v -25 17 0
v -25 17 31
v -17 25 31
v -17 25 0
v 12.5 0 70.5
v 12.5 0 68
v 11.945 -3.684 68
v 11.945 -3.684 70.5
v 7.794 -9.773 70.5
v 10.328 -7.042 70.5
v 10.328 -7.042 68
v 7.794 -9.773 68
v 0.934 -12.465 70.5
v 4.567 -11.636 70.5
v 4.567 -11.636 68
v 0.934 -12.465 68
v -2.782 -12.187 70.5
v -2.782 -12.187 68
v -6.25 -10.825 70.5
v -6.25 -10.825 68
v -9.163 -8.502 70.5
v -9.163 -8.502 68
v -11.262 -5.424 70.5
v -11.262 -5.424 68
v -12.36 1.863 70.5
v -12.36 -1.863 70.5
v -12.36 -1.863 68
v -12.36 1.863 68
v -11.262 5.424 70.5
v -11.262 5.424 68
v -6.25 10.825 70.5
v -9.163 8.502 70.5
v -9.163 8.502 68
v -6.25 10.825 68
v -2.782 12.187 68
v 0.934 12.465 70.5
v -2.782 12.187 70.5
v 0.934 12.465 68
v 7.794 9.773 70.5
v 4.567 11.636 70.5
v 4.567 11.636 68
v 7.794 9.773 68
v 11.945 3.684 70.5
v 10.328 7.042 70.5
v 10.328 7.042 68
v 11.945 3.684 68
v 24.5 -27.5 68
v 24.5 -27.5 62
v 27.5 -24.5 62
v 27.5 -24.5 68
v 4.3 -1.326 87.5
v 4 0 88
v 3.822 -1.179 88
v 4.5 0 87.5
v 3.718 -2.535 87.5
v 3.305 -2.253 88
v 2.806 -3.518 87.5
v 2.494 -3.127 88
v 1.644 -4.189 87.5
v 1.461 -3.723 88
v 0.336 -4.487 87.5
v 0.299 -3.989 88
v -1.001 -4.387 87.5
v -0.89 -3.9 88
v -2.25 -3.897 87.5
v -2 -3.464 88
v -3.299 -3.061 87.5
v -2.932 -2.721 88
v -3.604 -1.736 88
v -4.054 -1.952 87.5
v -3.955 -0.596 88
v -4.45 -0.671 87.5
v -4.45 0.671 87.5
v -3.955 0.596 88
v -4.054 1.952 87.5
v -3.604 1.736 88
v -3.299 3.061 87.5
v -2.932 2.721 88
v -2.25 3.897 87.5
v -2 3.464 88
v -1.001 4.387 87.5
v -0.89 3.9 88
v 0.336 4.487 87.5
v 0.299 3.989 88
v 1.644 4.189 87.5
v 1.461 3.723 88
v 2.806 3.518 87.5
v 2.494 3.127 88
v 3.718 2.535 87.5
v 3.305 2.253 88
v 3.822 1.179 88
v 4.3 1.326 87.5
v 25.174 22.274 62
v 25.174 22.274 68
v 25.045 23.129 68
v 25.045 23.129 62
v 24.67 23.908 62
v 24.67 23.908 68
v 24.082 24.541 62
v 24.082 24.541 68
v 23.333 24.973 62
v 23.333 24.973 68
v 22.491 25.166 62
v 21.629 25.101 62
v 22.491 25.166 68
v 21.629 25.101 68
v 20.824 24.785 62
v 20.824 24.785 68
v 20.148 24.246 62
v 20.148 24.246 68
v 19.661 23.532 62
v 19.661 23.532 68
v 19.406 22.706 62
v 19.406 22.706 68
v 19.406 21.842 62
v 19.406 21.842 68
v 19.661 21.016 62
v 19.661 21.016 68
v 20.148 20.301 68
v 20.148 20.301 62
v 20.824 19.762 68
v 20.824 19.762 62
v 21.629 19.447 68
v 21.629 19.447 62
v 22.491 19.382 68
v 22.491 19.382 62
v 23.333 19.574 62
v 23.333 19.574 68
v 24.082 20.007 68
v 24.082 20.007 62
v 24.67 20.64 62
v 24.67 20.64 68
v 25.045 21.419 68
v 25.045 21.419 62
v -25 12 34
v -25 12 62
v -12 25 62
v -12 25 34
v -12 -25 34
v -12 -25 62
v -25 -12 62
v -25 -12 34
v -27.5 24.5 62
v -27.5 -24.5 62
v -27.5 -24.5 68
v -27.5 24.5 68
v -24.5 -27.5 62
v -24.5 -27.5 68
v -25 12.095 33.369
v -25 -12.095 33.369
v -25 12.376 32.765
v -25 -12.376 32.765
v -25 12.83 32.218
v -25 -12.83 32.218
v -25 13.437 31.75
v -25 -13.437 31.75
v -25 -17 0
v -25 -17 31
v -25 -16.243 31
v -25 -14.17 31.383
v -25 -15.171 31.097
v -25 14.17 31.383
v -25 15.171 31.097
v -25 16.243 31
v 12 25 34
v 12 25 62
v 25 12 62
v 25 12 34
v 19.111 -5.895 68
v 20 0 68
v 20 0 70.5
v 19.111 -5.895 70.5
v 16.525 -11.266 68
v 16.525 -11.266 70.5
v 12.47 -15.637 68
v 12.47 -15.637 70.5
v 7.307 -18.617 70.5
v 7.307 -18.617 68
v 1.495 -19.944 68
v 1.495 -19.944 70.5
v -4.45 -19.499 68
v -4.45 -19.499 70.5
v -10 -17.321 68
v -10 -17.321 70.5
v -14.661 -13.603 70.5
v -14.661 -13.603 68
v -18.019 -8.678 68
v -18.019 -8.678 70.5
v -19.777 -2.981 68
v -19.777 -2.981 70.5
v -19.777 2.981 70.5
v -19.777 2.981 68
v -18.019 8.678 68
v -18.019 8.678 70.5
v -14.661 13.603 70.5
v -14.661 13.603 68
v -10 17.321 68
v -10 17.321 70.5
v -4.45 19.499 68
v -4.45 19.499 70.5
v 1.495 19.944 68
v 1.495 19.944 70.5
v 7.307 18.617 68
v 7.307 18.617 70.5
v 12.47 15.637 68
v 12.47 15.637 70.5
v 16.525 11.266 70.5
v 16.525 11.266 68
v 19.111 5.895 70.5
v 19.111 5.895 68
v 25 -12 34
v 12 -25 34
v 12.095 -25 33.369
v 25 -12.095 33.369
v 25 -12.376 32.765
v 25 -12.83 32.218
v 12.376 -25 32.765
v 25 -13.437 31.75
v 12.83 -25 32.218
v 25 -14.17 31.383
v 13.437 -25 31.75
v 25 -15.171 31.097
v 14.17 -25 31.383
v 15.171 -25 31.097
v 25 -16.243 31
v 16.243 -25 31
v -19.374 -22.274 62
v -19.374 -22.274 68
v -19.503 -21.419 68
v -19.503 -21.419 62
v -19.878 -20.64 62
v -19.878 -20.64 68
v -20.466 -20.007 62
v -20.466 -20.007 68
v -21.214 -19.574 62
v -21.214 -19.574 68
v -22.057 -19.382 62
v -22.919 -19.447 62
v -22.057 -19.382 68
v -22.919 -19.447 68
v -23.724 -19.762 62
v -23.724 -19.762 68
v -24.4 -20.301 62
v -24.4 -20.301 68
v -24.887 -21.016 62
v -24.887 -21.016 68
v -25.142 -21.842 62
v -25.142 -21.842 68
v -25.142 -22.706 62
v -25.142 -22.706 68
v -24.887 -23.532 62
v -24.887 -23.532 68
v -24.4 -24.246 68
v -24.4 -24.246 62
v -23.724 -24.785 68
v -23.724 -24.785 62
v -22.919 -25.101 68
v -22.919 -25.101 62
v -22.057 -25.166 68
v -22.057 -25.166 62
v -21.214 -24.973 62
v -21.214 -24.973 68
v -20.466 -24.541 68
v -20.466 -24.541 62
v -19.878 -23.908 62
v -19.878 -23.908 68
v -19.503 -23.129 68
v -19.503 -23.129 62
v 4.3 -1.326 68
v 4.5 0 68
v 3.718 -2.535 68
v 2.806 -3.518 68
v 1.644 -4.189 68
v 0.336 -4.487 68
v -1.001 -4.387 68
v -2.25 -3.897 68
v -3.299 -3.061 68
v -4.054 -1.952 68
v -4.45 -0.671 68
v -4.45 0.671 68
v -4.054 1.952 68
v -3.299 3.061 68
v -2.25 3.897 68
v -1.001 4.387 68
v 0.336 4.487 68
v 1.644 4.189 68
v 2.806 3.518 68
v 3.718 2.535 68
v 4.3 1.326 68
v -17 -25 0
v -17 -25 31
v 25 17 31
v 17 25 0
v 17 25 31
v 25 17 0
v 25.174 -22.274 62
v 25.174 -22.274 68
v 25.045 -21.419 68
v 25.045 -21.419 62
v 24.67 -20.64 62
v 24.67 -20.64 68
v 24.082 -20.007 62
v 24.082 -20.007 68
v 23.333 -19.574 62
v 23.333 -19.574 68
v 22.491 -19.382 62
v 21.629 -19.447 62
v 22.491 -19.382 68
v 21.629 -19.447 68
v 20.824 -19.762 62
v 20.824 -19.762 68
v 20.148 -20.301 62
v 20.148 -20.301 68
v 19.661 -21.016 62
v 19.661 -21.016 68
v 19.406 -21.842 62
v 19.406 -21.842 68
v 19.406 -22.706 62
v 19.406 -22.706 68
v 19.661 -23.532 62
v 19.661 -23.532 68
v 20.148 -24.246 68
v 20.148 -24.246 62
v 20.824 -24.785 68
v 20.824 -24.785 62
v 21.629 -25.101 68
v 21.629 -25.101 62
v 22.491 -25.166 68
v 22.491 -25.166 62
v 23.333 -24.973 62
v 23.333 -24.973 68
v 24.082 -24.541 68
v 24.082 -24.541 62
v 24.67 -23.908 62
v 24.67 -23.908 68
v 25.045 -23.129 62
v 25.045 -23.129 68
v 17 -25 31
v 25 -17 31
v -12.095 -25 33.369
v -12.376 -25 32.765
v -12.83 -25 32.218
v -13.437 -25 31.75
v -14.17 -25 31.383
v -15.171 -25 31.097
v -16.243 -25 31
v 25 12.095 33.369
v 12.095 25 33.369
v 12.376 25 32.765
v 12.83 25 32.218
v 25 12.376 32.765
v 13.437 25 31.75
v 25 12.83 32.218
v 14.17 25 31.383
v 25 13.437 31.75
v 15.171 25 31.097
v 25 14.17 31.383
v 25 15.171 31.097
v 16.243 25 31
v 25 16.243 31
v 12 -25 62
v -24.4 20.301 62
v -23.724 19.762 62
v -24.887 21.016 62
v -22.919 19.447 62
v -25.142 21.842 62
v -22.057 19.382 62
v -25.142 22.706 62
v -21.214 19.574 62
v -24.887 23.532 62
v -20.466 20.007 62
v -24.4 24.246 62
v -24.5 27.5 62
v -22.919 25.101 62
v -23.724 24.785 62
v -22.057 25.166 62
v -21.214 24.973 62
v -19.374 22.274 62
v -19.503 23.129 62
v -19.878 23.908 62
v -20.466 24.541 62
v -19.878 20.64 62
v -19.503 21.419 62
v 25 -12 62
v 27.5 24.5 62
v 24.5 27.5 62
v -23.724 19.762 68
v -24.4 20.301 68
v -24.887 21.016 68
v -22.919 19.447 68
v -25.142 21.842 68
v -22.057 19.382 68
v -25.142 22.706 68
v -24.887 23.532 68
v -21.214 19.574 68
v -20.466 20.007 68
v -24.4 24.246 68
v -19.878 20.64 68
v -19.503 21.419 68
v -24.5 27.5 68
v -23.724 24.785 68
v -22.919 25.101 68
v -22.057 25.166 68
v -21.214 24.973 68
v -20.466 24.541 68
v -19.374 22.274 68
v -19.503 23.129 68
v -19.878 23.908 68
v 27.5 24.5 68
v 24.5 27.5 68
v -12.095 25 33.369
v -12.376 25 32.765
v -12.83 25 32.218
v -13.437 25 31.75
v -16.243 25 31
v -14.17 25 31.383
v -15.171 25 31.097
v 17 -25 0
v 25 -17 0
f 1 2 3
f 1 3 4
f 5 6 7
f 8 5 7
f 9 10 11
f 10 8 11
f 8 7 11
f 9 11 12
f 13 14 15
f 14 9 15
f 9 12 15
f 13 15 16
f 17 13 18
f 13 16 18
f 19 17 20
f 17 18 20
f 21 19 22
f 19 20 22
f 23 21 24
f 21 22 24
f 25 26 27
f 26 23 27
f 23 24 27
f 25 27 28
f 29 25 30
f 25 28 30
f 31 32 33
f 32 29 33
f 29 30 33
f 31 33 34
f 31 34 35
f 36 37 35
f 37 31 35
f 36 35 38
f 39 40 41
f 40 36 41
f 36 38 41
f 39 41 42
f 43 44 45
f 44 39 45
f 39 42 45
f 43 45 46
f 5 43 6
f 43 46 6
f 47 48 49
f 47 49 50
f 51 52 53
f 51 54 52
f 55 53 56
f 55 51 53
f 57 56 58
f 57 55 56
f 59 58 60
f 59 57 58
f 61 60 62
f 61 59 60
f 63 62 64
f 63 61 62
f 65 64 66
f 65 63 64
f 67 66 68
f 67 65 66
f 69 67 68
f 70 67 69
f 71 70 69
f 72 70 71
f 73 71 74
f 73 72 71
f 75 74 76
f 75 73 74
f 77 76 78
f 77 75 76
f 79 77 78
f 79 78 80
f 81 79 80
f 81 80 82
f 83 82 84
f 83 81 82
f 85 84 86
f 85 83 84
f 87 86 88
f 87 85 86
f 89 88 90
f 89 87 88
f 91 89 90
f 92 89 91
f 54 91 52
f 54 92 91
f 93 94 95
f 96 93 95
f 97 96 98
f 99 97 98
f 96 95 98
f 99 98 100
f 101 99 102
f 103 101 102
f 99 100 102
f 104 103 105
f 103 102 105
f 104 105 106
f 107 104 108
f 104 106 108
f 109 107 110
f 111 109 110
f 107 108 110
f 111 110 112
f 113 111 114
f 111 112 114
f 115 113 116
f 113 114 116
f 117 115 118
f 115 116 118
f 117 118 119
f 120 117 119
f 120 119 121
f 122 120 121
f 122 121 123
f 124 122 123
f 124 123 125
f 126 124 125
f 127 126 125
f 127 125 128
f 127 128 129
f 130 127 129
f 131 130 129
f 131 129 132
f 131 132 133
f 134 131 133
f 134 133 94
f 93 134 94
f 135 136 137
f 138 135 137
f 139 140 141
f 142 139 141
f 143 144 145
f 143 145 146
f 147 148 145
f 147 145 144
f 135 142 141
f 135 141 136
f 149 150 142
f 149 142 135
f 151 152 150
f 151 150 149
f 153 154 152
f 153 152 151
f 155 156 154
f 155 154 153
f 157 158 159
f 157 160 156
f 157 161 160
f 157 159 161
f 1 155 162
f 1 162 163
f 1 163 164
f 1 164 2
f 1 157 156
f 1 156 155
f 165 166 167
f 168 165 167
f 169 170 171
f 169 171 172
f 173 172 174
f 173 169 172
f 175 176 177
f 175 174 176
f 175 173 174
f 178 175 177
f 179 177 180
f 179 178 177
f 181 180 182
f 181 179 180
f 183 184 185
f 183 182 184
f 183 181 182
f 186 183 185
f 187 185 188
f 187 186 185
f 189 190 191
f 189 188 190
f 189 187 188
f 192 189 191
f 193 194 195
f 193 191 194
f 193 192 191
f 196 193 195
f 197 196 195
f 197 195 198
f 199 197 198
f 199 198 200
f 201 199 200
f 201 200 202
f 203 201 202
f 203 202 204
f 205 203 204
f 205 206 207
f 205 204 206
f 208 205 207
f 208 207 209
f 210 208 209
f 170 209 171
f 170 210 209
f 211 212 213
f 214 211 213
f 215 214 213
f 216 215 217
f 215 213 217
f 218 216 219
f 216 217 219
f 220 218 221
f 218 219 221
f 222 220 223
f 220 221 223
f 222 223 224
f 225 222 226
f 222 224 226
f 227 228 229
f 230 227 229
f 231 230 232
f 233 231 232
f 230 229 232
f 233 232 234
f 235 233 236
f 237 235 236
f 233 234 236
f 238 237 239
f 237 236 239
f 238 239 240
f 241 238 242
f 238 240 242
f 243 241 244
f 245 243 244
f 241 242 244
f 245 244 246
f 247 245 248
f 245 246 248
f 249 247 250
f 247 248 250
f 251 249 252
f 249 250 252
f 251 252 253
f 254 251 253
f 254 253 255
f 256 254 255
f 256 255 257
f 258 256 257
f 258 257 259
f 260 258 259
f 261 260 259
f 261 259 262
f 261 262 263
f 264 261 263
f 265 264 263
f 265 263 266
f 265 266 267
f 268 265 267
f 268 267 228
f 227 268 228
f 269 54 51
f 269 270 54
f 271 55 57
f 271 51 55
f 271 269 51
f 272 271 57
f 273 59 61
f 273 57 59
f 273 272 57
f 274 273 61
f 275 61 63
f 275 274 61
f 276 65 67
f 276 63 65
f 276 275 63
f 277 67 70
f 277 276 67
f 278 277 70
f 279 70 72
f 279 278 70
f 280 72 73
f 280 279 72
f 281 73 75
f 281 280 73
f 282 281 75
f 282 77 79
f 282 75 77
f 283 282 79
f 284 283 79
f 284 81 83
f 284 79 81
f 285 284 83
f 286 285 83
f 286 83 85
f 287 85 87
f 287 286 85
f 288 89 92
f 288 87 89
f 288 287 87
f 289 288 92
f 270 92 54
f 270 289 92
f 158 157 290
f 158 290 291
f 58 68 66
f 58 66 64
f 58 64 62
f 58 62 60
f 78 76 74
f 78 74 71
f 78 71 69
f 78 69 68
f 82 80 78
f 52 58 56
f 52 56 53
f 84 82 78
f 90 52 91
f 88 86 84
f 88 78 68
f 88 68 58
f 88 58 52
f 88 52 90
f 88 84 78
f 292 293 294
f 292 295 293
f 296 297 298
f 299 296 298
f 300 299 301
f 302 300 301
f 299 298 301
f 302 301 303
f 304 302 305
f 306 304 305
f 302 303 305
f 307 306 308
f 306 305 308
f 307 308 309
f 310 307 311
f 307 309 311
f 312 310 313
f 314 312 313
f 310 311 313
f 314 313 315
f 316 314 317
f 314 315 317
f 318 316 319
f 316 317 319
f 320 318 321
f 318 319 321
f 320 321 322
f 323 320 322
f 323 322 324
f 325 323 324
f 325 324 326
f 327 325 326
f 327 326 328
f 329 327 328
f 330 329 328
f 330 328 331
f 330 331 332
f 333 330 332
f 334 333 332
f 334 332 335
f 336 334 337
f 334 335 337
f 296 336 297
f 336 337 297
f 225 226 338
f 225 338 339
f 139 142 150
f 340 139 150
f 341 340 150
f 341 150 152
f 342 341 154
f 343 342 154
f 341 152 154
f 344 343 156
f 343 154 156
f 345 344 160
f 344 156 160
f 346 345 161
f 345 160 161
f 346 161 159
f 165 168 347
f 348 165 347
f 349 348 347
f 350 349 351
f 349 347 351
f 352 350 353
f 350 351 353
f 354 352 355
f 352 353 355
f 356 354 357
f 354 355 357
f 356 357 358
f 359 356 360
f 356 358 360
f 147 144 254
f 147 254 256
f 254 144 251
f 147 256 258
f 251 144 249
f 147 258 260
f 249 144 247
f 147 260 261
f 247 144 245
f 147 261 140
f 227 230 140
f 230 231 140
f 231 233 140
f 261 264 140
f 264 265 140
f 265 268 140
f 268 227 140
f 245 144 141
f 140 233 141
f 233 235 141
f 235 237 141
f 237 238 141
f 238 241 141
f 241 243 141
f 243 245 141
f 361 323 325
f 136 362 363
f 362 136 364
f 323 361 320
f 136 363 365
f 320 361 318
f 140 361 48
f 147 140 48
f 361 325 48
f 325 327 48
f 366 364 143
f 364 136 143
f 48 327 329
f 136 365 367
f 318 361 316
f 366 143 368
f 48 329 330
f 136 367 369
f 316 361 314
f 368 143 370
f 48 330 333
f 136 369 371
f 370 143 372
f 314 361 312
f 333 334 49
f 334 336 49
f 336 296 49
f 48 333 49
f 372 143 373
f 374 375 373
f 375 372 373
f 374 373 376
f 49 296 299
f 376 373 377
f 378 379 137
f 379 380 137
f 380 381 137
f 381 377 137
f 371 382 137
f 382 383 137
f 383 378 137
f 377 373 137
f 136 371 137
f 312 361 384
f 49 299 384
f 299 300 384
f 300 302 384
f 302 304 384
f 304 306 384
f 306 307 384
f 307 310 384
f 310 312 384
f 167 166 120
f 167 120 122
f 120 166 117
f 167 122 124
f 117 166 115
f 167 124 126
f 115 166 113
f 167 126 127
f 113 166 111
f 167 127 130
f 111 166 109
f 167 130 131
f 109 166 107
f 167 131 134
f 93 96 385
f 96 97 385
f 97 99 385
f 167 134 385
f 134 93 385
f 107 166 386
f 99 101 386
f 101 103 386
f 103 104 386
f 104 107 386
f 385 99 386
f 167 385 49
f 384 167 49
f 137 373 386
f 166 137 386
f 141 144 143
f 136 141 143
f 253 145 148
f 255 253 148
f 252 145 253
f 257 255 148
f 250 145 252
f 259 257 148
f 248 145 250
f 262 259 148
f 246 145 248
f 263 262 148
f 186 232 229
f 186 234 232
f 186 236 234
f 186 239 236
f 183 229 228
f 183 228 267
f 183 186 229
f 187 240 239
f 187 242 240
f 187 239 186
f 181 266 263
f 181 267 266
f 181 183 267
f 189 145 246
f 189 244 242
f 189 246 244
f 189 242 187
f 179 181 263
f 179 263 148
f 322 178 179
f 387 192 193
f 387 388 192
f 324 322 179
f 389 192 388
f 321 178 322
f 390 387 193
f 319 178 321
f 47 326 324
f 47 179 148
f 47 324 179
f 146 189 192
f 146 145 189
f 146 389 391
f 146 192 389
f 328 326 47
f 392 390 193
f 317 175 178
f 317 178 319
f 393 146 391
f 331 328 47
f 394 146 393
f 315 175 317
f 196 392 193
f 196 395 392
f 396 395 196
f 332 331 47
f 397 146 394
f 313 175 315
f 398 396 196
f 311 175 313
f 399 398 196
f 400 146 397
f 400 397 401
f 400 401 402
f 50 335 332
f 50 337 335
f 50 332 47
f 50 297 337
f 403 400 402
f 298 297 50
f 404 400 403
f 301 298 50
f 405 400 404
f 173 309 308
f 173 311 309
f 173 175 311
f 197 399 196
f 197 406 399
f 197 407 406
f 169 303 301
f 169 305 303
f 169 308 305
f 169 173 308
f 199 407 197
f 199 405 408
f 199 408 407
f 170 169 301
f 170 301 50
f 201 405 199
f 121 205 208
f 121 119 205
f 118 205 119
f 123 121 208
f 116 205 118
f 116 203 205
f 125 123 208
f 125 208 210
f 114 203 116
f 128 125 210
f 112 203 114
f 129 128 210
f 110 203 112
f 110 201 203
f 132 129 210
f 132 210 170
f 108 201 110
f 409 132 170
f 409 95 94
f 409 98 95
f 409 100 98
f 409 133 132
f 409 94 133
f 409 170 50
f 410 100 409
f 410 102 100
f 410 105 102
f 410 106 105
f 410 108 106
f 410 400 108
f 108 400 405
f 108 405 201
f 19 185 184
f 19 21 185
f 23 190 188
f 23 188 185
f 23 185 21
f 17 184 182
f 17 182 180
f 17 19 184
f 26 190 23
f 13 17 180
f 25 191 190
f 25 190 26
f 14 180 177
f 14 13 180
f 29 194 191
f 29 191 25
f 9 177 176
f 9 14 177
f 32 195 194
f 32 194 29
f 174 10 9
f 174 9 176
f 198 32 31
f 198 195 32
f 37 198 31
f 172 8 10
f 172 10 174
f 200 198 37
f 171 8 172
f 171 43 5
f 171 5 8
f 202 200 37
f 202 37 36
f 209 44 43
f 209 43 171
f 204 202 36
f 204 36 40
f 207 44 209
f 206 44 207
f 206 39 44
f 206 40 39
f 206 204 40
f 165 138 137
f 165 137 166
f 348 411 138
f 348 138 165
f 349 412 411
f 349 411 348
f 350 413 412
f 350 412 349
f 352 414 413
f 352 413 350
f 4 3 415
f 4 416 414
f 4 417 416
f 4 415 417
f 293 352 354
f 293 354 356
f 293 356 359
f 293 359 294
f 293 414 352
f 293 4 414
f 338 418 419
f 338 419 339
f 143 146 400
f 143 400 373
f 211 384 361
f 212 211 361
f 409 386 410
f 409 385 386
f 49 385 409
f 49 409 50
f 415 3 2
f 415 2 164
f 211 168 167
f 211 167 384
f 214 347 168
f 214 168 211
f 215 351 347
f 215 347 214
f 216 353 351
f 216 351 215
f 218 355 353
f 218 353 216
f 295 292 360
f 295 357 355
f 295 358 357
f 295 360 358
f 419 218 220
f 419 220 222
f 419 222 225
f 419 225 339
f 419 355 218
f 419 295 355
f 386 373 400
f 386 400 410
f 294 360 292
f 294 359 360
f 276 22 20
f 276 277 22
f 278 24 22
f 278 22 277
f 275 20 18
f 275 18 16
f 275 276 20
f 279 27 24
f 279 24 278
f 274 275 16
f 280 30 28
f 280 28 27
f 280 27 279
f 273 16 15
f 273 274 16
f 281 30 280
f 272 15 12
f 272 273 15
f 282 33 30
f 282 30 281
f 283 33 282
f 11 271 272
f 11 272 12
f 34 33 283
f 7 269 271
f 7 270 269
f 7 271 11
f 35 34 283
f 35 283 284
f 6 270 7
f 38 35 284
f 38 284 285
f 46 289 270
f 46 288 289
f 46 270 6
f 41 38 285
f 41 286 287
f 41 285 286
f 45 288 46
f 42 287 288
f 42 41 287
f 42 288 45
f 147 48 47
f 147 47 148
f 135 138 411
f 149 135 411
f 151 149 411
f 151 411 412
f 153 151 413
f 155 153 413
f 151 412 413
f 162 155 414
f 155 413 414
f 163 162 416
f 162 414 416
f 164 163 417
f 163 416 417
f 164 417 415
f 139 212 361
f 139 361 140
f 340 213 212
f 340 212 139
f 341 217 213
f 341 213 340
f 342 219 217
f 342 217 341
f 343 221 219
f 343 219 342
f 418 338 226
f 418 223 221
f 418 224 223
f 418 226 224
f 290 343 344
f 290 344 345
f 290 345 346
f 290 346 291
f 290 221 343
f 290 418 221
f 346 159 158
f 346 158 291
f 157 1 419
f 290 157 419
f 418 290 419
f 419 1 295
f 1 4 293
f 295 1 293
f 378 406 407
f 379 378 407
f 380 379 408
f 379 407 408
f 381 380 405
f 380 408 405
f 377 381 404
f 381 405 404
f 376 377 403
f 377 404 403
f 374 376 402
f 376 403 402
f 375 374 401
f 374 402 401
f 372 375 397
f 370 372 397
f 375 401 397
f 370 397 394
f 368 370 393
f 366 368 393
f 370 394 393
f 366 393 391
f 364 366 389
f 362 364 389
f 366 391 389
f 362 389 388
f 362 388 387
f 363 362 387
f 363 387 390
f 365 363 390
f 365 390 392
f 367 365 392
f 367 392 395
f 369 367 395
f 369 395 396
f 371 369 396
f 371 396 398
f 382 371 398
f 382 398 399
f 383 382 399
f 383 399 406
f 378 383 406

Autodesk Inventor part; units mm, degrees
ref_plane "YZ Plane" through (0, 0, 0) normal (1, 0, 0) x (0, 1, 0)
ref_plane "XZ Plane" through (0, 0, 0) normal (0, 1, 0) x (-1, 0, 0)
ref_plane "XY Plane" through (0, 0, 0) normal (0, 0, 1) x (1, 0, 0)
sketch "Esquisse1" plane through (0, 0, 0) normal (0, 0, 1) x (1, 0, 0)
  line L0 (-25, 25) -> (25, 25)
  line L1 (25, 25) -> (25, -25)
  line L2 (25, -25) -> (-25, -25)
  line L3 (-25, -25) -> (-25, 25)
  point P0 (0, 0)
  dimension "d0" = 50
  dimension "d1" = 25
  dimension "d2" = 50
  dimension "d3" = 25
extrude "Extrusion1" add sketch "Esquisse1" along normal blind 31
chamfer "Chanfrein1" distance 8 angle 45 4 edges at (25, 25, 15.5) (-25, 25, 15.5) (-25, -25, 15.5) (25, -25, 15.5)
sketch "Esquisse4" plane through (0, 0, 31) normal (0, 0, 1) x (1, 0, 0)
  line L0 (17, 25) -> (-17, 25) projected
  line L1 (-12, 25) -> (12, 25)
  line L2 (25, 17) -> (25, -17) projected
  line L3 (25, 12) -> (25, -12)
  line L4 (-17, -25) -> (17, -25) projected
  line L5 (12, -25) -> (-12, -25)
  line L6 (-25, 17) -> (-25, -17) projected
  line L7 (-25, -12) -> (-25, 12)
  line L8 (-25, 12) -> (-12, 25)
  line L9 (12, 25) -> (25, 12)
  line L10 (17, 25) -> (25, 17) projected
  line L11 (25, -12) -> (12, -25)
  line L12 (-12, -25) -> (-25, -12)
  point P0 (0, 0)
  dimension "d11" = 24
  dimension "d12" = 24
  dimension "d13" = 24
  dimension "d14" = 24
  dimension "d15" = 12
  dimension "d16" = 12
extrude "Extrusion3" add sketch "Esquisse4" along normal blind 31 contours L9 L2 L11 L4 L12 L6 L8 L0
sketch "Esquisse5" plane through (0, 0, 62) normal (0, 0, 1) x (1, 0, 0)
  line L0 (-27.5, 27.5) -> (27.5, 27.5)
  line L1 (27.5, 27.5) -> (27.5, -27.5)
  line L2 (27.5, -27.5) -> (-27.5, -27.5)
  line L3 (-27.5, -27.5) -> (-27.5, 27.5)
  point P0 (0, 0)
  dimension "d19" = 55
  dimension "d20" = 55
  dimension "d21" = 27.5
  dimension "d22" = 27.5
extrude "Extrusion4" add sketch "Esquisse5" along normal blind 6
sketch "Esquisse6" plane through (0, 0, 68) normal (0, 0, 1) x (1, 0, 0)
  circle A0 centre (0, 0) radius 20
  circle A1 centre (0, 0) radius 12.5
  dimension "d25" = 40
  dimension "d26" = 25
extrude "Extrusion5" add sketch "Esquisse6" along normal blind 2.5
sketch "Esquisse7" plane through (0, 0, 68) normal (0, 0, 1) x (1, 0, 0)
  circle A0 centre (0, 0) radius 4.5
  dimension "d29" = 9
extrude "Extrusion6" add sketch "Esquisse7" along normal blind 20
sketch "Esquisse8" plane through (0, 0, 68) normal (0, 0, 1) x (1, 0, 0)
  circle A0 centre (-22.2739, 22.2739) radius 2.9
  line L0 (-22.2739, 22.2739) -> (-27.5, 22.2739)
  line L1 (-27.5, 27.5) -> (-27.5, -27.5) projected
  line L2 (-22.2739, 22.2739) -> (-22.2739, 27.5)
  line L3 (27.5, 27.5) -> (-27.5, 27.5) projected
  circle A1 centre (-22.2739, -22.2739) radius 2.9
  circle A2 centre (22.2739, -22.2739) radius 2.9
  circle A3 centre (22.2739, 22.2739) radius 2.9
  point P0 (0, 0)
  dimension "d32" = 5.8
  dimension "d33" = 31.5
  dimension "d36" = 360
extrude "Extrusion7" cut sketch "Esquisse8" against normal blind 6 contours A0 L0 L2 | L2 L0 A0 | A1 | A2 | A3
chamfer "Chanfrein2" distance 3 angle 45 4 edges at (-27.5, 27.5, 65) (27.5, 27.5, 65) (27.5, -27.5, 65) (-27.5, -27.5, 65)
fillet "Congé1" radius 3 4 edges at (18.5, 18.5, 31) (18.5, -18.5, 31) (-18.5, 18.5, 31) (-18.5, -18.5, 31)
chamfer "Chanfrein3" distance 0.5 angle 45 1 edges at (-4.5, 0, 88)
equation "\"d1\" = 0.5 * d0"
equation "\"d2\" = d0"
equation "\"d3\" = 0.5 * d2"
equation "\"d12\" = d11"
equation "\"d13\" = d11"
equation "\"d14\" = d11"
equation "\"d15\" = 0.5 * d14"
equation "\"d16\" = 0.5 * d11"
equation "\"d20\" = d19"
equation "\"d21\" = 0.5 * d20"
equation "\"d22\" = 0.5 * d19"
properties part number "N2-0028-30-24" material "Aluminium 6061"
